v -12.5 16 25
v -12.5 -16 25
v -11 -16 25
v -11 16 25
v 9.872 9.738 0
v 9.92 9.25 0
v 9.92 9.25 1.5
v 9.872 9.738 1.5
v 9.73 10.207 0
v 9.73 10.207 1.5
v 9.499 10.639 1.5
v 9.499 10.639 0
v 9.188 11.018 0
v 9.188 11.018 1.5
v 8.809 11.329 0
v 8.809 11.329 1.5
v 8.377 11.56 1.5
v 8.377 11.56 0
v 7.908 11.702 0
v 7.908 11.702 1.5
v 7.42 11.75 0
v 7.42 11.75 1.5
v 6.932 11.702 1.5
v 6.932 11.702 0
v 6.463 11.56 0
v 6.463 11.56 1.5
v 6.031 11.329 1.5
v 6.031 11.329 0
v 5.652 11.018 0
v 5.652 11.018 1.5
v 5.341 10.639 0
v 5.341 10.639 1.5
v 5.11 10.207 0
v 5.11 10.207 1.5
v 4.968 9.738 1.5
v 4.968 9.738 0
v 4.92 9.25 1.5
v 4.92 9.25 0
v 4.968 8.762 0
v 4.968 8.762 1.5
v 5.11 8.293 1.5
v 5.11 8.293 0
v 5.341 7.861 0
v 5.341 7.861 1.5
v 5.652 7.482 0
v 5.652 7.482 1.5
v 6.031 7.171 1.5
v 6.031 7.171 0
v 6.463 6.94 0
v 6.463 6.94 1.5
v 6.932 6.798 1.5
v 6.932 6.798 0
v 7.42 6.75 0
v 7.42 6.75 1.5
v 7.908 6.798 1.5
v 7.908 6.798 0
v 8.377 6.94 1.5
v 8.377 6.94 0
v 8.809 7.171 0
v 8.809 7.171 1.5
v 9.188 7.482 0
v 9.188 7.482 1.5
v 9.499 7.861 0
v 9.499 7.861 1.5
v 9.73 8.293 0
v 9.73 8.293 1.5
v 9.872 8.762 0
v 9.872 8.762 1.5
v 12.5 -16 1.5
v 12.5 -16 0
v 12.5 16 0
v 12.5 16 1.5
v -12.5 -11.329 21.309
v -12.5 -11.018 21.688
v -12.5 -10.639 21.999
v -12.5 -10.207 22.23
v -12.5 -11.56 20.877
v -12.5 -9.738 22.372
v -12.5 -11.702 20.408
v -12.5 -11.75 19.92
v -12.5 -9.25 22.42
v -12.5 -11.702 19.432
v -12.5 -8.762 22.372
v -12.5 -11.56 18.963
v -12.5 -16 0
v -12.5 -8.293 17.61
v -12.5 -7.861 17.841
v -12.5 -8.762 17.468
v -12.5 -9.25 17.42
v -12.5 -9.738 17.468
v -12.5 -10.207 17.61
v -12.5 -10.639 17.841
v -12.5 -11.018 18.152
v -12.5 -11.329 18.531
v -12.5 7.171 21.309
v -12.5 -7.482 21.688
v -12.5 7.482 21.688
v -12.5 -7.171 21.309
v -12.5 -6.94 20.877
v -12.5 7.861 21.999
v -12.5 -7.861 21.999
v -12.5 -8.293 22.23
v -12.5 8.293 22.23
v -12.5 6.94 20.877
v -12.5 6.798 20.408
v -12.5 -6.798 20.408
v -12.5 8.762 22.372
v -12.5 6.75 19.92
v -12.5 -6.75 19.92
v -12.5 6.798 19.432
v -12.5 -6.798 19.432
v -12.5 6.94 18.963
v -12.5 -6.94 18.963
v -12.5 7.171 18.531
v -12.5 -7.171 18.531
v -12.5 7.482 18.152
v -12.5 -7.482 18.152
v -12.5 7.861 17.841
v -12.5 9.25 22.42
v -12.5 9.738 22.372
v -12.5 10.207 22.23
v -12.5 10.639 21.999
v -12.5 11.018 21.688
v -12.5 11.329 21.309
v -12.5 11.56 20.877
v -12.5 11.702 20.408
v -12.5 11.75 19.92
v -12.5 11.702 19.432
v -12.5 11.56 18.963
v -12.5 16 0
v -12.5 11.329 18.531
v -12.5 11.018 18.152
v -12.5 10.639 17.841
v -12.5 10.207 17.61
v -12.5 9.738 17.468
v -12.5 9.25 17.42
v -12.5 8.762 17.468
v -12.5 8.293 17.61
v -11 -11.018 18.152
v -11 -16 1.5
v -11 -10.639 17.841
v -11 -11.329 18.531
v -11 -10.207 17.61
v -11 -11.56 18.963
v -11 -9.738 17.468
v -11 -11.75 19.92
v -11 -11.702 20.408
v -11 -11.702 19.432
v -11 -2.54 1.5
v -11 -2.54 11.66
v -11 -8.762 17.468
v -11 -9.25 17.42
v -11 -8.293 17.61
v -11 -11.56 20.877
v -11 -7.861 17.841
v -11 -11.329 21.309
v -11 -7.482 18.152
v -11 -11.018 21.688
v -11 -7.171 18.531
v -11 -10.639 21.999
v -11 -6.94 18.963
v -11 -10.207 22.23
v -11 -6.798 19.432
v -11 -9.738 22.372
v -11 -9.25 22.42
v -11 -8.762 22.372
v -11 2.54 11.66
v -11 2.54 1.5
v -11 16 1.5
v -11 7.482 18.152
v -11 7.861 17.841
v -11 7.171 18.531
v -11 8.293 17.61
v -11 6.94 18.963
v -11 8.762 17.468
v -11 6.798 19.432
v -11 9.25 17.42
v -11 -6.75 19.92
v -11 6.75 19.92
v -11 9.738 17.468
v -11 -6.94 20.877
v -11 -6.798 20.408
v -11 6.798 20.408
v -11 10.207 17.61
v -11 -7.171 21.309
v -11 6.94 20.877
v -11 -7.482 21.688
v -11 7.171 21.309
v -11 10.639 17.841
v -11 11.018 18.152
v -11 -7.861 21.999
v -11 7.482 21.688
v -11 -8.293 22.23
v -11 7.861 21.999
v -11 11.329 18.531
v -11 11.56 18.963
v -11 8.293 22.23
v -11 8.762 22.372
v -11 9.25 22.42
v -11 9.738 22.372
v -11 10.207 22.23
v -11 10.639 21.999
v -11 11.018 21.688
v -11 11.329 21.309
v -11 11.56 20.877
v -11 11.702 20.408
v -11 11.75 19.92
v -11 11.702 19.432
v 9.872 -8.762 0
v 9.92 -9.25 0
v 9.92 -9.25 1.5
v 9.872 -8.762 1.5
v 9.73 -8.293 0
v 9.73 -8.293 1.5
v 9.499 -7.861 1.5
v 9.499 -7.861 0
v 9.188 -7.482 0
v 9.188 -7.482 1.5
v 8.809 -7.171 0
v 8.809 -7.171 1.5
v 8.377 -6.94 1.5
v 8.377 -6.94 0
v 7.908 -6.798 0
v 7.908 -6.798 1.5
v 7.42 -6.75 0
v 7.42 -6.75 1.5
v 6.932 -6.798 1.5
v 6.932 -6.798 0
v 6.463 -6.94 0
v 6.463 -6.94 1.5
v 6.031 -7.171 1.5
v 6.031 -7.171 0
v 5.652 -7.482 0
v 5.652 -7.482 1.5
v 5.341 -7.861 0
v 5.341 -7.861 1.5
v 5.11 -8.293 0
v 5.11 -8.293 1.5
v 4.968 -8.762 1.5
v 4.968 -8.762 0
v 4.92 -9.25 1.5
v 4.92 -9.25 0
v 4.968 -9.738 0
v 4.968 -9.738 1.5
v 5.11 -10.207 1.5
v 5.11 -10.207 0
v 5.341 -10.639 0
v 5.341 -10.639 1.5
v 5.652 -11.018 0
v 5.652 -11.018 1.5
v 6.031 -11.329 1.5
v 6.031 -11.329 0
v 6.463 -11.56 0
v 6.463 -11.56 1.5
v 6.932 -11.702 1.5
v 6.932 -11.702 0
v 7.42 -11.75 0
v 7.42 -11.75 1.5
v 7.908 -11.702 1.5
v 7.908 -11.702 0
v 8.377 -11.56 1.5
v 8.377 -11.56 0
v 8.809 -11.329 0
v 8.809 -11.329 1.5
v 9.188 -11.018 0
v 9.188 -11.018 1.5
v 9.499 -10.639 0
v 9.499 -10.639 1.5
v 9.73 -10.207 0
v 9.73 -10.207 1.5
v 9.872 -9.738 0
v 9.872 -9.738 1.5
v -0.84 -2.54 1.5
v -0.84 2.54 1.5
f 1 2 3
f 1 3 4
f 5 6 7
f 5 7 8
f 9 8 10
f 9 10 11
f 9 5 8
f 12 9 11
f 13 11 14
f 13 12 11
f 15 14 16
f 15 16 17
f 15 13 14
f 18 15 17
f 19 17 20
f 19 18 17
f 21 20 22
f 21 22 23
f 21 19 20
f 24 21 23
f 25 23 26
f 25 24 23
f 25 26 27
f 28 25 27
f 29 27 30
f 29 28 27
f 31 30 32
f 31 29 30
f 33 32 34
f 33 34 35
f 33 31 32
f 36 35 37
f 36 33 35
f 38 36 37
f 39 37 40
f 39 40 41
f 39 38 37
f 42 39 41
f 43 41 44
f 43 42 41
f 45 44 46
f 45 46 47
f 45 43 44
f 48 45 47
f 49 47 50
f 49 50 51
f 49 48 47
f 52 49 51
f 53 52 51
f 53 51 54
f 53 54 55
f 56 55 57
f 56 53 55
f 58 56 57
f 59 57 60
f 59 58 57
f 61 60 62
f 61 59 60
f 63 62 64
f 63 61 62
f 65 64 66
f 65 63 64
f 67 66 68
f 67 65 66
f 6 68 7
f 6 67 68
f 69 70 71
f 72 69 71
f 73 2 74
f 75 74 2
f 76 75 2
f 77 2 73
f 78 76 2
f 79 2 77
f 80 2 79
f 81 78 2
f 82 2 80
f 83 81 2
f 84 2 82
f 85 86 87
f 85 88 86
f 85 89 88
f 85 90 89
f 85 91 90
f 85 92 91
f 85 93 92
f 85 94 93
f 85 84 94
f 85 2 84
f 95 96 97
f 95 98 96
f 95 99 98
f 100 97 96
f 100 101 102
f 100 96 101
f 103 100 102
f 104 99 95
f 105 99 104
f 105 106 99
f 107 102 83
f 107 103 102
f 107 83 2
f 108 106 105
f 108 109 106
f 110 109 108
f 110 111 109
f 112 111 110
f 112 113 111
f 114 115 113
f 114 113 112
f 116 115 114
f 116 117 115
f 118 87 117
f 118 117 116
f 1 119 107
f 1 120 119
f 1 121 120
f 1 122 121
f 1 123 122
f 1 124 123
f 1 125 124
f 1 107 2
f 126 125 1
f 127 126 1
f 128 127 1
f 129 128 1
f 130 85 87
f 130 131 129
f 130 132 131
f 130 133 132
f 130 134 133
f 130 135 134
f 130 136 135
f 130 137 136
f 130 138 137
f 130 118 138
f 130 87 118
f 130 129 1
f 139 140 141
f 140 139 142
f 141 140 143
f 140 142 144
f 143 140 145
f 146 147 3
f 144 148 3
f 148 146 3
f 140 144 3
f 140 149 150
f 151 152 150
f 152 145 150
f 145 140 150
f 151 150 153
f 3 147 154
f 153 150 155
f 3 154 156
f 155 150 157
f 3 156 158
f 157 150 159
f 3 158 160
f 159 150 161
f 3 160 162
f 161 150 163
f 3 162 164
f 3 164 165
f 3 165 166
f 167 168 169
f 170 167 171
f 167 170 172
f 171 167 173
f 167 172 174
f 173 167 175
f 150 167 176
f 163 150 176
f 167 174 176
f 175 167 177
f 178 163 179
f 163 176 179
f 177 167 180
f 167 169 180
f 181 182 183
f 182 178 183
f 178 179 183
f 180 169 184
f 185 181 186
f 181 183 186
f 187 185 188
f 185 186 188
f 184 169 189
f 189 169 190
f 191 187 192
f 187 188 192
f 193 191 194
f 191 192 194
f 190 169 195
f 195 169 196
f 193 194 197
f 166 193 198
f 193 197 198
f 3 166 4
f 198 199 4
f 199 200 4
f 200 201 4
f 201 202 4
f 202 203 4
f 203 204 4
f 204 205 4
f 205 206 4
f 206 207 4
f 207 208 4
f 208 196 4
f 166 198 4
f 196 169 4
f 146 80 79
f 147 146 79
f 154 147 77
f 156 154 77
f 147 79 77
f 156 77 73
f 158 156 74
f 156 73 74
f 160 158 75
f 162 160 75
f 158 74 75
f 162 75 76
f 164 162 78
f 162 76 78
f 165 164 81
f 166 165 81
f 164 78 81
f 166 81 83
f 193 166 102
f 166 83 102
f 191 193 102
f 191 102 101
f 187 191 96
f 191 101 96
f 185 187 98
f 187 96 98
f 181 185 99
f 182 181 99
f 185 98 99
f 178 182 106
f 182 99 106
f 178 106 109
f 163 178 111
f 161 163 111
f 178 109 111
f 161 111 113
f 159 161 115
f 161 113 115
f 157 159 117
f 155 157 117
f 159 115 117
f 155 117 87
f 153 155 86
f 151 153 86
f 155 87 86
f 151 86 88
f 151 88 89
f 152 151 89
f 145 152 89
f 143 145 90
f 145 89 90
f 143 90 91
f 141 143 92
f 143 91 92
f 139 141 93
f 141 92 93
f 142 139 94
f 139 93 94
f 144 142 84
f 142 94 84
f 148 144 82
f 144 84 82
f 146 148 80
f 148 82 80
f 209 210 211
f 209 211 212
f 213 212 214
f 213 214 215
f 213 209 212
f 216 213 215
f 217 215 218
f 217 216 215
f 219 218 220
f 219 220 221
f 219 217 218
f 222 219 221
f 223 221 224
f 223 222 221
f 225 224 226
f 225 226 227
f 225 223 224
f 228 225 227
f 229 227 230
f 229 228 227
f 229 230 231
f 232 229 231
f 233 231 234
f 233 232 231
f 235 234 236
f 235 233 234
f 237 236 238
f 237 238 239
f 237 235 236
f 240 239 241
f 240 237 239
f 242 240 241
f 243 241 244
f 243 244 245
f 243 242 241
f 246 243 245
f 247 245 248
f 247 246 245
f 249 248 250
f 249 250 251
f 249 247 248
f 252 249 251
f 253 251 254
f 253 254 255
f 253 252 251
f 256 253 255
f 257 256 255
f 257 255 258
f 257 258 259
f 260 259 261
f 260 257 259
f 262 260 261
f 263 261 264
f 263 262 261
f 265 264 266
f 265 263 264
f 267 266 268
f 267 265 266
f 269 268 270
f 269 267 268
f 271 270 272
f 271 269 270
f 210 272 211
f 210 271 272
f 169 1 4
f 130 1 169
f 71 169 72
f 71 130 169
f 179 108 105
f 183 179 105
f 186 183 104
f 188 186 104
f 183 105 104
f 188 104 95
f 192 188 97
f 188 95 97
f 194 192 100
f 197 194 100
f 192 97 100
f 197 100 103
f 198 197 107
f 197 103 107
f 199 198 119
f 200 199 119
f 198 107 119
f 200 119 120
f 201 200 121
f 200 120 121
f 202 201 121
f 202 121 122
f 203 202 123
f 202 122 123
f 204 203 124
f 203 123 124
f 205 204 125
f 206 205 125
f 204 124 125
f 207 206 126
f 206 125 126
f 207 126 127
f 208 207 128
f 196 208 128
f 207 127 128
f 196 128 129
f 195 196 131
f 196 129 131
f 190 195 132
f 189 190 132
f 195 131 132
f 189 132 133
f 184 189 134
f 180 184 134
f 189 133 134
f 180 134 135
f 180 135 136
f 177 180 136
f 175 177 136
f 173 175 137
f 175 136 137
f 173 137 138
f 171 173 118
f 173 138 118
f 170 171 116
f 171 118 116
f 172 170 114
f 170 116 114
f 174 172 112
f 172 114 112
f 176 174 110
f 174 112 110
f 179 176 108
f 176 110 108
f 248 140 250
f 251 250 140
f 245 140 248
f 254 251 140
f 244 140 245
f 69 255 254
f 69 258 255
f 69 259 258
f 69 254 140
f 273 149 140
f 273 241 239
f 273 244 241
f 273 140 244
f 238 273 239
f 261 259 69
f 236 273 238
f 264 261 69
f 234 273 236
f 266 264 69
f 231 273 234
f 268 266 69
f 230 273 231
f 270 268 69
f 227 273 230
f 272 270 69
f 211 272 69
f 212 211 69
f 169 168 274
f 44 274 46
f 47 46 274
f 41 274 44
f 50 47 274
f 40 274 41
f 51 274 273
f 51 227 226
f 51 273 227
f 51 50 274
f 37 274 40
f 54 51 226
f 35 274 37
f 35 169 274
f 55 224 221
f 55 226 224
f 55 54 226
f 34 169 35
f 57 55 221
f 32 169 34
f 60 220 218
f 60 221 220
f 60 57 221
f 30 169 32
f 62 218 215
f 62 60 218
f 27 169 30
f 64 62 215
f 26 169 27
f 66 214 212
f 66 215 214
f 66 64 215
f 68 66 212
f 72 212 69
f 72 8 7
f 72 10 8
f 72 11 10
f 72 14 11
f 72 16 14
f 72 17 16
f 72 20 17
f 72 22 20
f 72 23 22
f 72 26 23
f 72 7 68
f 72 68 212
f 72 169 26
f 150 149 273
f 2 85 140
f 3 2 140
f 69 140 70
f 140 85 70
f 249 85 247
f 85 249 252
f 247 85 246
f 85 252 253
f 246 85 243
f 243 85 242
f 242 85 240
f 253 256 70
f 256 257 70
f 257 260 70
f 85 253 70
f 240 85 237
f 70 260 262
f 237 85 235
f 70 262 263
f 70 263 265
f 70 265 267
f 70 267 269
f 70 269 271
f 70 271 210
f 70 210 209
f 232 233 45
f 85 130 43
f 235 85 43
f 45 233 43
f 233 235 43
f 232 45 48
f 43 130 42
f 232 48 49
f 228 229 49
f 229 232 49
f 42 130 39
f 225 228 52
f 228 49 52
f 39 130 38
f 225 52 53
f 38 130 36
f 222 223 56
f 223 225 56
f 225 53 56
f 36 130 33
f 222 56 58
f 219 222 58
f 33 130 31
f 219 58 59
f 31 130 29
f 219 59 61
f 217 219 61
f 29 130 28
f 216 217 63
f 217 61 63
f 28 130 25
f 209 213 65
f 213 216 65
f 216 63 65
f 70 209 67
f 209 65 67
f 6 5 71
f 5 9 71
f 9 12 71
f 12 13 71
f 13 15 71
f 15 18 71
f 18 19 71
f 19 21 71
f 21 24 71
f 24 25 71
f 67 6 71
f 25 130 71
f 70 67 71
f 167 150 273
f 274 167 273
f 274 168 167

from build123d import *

# Parameters (mm, degrees)
SKETCH1_W                = 25
SKETCH1_H                = 32
SKETCH1_R                = 2.5
BOSS_EXTRUDE1_DEPTH      = 1.5
SKETCH2_W                = 25
SKETCH2_H                = 32
SKETCH2_R                = 2.5
BOSS_EXTRUDE2_DEPTH      = 1.5
BOSS_EXTRUDE3_DEPTH      = 2.54
BOSS_EXTRUDE3_DEPTH_BACK = 2.54


with BuildPart() as part:
    # Sketch1 → Boss-Extrude1 (new body)
    with BuildSketch(Plane.XY):
        Rectangle(SKETCH1_W, SKETCH1_H)
        with Locations((7.42, -9.25)):
            Circle(SKETCH1_R, mode=Mode.SUBTRACT)
        with Locations((7.42, 9.25)):
            Circle(SKETCH1_R, mode=Mode.SUBTRACT)
    extrude(amount=BOSS_EXTRUDE1_DEPTH)

    # Sketch2 → Boss-Extrude2 (add)
    with BuildSketch(Plane.ZY.offset(12.5)):
        with Locations((12.5, 0)):
            Rectangle(SKETCH2_W, SKETCH2_H)
        with Locations(Location((19.92, -9.25, 0), (0, 0, 270))):
            Circle(SKETCH2_R, mode=Mode.SUBTRACT)
        with Locations(Location((19.92, 9.25, 0), (0, 0, 270))):
            Circle(SKETCH2_R, mode=Mode.SUBTRACT)
    extrude(amount=-BOSS_EXTRUDE2_DEPTH)

    # Sketch3 → Boss-Extrude3 (add, two sides: drawn at the far end of the back side and taken through both)
    with BuildSketch(Plane(origin=(0, 0, 0), x_dir=(1, 0, 0), z_dir=(0, 1, 0)).offset(-BOSS_EXTRUDE3_DEPTH_BACK)):
        Polygon((-11, -1.5), (-11, -11.66), (-0.84, -1.5), align=None)
    extrude(amount=BOSS_EXTRUDE3_DEPTH + BOSS_EXTRUDE3_DEPTH_BACK)


solid = part.part
